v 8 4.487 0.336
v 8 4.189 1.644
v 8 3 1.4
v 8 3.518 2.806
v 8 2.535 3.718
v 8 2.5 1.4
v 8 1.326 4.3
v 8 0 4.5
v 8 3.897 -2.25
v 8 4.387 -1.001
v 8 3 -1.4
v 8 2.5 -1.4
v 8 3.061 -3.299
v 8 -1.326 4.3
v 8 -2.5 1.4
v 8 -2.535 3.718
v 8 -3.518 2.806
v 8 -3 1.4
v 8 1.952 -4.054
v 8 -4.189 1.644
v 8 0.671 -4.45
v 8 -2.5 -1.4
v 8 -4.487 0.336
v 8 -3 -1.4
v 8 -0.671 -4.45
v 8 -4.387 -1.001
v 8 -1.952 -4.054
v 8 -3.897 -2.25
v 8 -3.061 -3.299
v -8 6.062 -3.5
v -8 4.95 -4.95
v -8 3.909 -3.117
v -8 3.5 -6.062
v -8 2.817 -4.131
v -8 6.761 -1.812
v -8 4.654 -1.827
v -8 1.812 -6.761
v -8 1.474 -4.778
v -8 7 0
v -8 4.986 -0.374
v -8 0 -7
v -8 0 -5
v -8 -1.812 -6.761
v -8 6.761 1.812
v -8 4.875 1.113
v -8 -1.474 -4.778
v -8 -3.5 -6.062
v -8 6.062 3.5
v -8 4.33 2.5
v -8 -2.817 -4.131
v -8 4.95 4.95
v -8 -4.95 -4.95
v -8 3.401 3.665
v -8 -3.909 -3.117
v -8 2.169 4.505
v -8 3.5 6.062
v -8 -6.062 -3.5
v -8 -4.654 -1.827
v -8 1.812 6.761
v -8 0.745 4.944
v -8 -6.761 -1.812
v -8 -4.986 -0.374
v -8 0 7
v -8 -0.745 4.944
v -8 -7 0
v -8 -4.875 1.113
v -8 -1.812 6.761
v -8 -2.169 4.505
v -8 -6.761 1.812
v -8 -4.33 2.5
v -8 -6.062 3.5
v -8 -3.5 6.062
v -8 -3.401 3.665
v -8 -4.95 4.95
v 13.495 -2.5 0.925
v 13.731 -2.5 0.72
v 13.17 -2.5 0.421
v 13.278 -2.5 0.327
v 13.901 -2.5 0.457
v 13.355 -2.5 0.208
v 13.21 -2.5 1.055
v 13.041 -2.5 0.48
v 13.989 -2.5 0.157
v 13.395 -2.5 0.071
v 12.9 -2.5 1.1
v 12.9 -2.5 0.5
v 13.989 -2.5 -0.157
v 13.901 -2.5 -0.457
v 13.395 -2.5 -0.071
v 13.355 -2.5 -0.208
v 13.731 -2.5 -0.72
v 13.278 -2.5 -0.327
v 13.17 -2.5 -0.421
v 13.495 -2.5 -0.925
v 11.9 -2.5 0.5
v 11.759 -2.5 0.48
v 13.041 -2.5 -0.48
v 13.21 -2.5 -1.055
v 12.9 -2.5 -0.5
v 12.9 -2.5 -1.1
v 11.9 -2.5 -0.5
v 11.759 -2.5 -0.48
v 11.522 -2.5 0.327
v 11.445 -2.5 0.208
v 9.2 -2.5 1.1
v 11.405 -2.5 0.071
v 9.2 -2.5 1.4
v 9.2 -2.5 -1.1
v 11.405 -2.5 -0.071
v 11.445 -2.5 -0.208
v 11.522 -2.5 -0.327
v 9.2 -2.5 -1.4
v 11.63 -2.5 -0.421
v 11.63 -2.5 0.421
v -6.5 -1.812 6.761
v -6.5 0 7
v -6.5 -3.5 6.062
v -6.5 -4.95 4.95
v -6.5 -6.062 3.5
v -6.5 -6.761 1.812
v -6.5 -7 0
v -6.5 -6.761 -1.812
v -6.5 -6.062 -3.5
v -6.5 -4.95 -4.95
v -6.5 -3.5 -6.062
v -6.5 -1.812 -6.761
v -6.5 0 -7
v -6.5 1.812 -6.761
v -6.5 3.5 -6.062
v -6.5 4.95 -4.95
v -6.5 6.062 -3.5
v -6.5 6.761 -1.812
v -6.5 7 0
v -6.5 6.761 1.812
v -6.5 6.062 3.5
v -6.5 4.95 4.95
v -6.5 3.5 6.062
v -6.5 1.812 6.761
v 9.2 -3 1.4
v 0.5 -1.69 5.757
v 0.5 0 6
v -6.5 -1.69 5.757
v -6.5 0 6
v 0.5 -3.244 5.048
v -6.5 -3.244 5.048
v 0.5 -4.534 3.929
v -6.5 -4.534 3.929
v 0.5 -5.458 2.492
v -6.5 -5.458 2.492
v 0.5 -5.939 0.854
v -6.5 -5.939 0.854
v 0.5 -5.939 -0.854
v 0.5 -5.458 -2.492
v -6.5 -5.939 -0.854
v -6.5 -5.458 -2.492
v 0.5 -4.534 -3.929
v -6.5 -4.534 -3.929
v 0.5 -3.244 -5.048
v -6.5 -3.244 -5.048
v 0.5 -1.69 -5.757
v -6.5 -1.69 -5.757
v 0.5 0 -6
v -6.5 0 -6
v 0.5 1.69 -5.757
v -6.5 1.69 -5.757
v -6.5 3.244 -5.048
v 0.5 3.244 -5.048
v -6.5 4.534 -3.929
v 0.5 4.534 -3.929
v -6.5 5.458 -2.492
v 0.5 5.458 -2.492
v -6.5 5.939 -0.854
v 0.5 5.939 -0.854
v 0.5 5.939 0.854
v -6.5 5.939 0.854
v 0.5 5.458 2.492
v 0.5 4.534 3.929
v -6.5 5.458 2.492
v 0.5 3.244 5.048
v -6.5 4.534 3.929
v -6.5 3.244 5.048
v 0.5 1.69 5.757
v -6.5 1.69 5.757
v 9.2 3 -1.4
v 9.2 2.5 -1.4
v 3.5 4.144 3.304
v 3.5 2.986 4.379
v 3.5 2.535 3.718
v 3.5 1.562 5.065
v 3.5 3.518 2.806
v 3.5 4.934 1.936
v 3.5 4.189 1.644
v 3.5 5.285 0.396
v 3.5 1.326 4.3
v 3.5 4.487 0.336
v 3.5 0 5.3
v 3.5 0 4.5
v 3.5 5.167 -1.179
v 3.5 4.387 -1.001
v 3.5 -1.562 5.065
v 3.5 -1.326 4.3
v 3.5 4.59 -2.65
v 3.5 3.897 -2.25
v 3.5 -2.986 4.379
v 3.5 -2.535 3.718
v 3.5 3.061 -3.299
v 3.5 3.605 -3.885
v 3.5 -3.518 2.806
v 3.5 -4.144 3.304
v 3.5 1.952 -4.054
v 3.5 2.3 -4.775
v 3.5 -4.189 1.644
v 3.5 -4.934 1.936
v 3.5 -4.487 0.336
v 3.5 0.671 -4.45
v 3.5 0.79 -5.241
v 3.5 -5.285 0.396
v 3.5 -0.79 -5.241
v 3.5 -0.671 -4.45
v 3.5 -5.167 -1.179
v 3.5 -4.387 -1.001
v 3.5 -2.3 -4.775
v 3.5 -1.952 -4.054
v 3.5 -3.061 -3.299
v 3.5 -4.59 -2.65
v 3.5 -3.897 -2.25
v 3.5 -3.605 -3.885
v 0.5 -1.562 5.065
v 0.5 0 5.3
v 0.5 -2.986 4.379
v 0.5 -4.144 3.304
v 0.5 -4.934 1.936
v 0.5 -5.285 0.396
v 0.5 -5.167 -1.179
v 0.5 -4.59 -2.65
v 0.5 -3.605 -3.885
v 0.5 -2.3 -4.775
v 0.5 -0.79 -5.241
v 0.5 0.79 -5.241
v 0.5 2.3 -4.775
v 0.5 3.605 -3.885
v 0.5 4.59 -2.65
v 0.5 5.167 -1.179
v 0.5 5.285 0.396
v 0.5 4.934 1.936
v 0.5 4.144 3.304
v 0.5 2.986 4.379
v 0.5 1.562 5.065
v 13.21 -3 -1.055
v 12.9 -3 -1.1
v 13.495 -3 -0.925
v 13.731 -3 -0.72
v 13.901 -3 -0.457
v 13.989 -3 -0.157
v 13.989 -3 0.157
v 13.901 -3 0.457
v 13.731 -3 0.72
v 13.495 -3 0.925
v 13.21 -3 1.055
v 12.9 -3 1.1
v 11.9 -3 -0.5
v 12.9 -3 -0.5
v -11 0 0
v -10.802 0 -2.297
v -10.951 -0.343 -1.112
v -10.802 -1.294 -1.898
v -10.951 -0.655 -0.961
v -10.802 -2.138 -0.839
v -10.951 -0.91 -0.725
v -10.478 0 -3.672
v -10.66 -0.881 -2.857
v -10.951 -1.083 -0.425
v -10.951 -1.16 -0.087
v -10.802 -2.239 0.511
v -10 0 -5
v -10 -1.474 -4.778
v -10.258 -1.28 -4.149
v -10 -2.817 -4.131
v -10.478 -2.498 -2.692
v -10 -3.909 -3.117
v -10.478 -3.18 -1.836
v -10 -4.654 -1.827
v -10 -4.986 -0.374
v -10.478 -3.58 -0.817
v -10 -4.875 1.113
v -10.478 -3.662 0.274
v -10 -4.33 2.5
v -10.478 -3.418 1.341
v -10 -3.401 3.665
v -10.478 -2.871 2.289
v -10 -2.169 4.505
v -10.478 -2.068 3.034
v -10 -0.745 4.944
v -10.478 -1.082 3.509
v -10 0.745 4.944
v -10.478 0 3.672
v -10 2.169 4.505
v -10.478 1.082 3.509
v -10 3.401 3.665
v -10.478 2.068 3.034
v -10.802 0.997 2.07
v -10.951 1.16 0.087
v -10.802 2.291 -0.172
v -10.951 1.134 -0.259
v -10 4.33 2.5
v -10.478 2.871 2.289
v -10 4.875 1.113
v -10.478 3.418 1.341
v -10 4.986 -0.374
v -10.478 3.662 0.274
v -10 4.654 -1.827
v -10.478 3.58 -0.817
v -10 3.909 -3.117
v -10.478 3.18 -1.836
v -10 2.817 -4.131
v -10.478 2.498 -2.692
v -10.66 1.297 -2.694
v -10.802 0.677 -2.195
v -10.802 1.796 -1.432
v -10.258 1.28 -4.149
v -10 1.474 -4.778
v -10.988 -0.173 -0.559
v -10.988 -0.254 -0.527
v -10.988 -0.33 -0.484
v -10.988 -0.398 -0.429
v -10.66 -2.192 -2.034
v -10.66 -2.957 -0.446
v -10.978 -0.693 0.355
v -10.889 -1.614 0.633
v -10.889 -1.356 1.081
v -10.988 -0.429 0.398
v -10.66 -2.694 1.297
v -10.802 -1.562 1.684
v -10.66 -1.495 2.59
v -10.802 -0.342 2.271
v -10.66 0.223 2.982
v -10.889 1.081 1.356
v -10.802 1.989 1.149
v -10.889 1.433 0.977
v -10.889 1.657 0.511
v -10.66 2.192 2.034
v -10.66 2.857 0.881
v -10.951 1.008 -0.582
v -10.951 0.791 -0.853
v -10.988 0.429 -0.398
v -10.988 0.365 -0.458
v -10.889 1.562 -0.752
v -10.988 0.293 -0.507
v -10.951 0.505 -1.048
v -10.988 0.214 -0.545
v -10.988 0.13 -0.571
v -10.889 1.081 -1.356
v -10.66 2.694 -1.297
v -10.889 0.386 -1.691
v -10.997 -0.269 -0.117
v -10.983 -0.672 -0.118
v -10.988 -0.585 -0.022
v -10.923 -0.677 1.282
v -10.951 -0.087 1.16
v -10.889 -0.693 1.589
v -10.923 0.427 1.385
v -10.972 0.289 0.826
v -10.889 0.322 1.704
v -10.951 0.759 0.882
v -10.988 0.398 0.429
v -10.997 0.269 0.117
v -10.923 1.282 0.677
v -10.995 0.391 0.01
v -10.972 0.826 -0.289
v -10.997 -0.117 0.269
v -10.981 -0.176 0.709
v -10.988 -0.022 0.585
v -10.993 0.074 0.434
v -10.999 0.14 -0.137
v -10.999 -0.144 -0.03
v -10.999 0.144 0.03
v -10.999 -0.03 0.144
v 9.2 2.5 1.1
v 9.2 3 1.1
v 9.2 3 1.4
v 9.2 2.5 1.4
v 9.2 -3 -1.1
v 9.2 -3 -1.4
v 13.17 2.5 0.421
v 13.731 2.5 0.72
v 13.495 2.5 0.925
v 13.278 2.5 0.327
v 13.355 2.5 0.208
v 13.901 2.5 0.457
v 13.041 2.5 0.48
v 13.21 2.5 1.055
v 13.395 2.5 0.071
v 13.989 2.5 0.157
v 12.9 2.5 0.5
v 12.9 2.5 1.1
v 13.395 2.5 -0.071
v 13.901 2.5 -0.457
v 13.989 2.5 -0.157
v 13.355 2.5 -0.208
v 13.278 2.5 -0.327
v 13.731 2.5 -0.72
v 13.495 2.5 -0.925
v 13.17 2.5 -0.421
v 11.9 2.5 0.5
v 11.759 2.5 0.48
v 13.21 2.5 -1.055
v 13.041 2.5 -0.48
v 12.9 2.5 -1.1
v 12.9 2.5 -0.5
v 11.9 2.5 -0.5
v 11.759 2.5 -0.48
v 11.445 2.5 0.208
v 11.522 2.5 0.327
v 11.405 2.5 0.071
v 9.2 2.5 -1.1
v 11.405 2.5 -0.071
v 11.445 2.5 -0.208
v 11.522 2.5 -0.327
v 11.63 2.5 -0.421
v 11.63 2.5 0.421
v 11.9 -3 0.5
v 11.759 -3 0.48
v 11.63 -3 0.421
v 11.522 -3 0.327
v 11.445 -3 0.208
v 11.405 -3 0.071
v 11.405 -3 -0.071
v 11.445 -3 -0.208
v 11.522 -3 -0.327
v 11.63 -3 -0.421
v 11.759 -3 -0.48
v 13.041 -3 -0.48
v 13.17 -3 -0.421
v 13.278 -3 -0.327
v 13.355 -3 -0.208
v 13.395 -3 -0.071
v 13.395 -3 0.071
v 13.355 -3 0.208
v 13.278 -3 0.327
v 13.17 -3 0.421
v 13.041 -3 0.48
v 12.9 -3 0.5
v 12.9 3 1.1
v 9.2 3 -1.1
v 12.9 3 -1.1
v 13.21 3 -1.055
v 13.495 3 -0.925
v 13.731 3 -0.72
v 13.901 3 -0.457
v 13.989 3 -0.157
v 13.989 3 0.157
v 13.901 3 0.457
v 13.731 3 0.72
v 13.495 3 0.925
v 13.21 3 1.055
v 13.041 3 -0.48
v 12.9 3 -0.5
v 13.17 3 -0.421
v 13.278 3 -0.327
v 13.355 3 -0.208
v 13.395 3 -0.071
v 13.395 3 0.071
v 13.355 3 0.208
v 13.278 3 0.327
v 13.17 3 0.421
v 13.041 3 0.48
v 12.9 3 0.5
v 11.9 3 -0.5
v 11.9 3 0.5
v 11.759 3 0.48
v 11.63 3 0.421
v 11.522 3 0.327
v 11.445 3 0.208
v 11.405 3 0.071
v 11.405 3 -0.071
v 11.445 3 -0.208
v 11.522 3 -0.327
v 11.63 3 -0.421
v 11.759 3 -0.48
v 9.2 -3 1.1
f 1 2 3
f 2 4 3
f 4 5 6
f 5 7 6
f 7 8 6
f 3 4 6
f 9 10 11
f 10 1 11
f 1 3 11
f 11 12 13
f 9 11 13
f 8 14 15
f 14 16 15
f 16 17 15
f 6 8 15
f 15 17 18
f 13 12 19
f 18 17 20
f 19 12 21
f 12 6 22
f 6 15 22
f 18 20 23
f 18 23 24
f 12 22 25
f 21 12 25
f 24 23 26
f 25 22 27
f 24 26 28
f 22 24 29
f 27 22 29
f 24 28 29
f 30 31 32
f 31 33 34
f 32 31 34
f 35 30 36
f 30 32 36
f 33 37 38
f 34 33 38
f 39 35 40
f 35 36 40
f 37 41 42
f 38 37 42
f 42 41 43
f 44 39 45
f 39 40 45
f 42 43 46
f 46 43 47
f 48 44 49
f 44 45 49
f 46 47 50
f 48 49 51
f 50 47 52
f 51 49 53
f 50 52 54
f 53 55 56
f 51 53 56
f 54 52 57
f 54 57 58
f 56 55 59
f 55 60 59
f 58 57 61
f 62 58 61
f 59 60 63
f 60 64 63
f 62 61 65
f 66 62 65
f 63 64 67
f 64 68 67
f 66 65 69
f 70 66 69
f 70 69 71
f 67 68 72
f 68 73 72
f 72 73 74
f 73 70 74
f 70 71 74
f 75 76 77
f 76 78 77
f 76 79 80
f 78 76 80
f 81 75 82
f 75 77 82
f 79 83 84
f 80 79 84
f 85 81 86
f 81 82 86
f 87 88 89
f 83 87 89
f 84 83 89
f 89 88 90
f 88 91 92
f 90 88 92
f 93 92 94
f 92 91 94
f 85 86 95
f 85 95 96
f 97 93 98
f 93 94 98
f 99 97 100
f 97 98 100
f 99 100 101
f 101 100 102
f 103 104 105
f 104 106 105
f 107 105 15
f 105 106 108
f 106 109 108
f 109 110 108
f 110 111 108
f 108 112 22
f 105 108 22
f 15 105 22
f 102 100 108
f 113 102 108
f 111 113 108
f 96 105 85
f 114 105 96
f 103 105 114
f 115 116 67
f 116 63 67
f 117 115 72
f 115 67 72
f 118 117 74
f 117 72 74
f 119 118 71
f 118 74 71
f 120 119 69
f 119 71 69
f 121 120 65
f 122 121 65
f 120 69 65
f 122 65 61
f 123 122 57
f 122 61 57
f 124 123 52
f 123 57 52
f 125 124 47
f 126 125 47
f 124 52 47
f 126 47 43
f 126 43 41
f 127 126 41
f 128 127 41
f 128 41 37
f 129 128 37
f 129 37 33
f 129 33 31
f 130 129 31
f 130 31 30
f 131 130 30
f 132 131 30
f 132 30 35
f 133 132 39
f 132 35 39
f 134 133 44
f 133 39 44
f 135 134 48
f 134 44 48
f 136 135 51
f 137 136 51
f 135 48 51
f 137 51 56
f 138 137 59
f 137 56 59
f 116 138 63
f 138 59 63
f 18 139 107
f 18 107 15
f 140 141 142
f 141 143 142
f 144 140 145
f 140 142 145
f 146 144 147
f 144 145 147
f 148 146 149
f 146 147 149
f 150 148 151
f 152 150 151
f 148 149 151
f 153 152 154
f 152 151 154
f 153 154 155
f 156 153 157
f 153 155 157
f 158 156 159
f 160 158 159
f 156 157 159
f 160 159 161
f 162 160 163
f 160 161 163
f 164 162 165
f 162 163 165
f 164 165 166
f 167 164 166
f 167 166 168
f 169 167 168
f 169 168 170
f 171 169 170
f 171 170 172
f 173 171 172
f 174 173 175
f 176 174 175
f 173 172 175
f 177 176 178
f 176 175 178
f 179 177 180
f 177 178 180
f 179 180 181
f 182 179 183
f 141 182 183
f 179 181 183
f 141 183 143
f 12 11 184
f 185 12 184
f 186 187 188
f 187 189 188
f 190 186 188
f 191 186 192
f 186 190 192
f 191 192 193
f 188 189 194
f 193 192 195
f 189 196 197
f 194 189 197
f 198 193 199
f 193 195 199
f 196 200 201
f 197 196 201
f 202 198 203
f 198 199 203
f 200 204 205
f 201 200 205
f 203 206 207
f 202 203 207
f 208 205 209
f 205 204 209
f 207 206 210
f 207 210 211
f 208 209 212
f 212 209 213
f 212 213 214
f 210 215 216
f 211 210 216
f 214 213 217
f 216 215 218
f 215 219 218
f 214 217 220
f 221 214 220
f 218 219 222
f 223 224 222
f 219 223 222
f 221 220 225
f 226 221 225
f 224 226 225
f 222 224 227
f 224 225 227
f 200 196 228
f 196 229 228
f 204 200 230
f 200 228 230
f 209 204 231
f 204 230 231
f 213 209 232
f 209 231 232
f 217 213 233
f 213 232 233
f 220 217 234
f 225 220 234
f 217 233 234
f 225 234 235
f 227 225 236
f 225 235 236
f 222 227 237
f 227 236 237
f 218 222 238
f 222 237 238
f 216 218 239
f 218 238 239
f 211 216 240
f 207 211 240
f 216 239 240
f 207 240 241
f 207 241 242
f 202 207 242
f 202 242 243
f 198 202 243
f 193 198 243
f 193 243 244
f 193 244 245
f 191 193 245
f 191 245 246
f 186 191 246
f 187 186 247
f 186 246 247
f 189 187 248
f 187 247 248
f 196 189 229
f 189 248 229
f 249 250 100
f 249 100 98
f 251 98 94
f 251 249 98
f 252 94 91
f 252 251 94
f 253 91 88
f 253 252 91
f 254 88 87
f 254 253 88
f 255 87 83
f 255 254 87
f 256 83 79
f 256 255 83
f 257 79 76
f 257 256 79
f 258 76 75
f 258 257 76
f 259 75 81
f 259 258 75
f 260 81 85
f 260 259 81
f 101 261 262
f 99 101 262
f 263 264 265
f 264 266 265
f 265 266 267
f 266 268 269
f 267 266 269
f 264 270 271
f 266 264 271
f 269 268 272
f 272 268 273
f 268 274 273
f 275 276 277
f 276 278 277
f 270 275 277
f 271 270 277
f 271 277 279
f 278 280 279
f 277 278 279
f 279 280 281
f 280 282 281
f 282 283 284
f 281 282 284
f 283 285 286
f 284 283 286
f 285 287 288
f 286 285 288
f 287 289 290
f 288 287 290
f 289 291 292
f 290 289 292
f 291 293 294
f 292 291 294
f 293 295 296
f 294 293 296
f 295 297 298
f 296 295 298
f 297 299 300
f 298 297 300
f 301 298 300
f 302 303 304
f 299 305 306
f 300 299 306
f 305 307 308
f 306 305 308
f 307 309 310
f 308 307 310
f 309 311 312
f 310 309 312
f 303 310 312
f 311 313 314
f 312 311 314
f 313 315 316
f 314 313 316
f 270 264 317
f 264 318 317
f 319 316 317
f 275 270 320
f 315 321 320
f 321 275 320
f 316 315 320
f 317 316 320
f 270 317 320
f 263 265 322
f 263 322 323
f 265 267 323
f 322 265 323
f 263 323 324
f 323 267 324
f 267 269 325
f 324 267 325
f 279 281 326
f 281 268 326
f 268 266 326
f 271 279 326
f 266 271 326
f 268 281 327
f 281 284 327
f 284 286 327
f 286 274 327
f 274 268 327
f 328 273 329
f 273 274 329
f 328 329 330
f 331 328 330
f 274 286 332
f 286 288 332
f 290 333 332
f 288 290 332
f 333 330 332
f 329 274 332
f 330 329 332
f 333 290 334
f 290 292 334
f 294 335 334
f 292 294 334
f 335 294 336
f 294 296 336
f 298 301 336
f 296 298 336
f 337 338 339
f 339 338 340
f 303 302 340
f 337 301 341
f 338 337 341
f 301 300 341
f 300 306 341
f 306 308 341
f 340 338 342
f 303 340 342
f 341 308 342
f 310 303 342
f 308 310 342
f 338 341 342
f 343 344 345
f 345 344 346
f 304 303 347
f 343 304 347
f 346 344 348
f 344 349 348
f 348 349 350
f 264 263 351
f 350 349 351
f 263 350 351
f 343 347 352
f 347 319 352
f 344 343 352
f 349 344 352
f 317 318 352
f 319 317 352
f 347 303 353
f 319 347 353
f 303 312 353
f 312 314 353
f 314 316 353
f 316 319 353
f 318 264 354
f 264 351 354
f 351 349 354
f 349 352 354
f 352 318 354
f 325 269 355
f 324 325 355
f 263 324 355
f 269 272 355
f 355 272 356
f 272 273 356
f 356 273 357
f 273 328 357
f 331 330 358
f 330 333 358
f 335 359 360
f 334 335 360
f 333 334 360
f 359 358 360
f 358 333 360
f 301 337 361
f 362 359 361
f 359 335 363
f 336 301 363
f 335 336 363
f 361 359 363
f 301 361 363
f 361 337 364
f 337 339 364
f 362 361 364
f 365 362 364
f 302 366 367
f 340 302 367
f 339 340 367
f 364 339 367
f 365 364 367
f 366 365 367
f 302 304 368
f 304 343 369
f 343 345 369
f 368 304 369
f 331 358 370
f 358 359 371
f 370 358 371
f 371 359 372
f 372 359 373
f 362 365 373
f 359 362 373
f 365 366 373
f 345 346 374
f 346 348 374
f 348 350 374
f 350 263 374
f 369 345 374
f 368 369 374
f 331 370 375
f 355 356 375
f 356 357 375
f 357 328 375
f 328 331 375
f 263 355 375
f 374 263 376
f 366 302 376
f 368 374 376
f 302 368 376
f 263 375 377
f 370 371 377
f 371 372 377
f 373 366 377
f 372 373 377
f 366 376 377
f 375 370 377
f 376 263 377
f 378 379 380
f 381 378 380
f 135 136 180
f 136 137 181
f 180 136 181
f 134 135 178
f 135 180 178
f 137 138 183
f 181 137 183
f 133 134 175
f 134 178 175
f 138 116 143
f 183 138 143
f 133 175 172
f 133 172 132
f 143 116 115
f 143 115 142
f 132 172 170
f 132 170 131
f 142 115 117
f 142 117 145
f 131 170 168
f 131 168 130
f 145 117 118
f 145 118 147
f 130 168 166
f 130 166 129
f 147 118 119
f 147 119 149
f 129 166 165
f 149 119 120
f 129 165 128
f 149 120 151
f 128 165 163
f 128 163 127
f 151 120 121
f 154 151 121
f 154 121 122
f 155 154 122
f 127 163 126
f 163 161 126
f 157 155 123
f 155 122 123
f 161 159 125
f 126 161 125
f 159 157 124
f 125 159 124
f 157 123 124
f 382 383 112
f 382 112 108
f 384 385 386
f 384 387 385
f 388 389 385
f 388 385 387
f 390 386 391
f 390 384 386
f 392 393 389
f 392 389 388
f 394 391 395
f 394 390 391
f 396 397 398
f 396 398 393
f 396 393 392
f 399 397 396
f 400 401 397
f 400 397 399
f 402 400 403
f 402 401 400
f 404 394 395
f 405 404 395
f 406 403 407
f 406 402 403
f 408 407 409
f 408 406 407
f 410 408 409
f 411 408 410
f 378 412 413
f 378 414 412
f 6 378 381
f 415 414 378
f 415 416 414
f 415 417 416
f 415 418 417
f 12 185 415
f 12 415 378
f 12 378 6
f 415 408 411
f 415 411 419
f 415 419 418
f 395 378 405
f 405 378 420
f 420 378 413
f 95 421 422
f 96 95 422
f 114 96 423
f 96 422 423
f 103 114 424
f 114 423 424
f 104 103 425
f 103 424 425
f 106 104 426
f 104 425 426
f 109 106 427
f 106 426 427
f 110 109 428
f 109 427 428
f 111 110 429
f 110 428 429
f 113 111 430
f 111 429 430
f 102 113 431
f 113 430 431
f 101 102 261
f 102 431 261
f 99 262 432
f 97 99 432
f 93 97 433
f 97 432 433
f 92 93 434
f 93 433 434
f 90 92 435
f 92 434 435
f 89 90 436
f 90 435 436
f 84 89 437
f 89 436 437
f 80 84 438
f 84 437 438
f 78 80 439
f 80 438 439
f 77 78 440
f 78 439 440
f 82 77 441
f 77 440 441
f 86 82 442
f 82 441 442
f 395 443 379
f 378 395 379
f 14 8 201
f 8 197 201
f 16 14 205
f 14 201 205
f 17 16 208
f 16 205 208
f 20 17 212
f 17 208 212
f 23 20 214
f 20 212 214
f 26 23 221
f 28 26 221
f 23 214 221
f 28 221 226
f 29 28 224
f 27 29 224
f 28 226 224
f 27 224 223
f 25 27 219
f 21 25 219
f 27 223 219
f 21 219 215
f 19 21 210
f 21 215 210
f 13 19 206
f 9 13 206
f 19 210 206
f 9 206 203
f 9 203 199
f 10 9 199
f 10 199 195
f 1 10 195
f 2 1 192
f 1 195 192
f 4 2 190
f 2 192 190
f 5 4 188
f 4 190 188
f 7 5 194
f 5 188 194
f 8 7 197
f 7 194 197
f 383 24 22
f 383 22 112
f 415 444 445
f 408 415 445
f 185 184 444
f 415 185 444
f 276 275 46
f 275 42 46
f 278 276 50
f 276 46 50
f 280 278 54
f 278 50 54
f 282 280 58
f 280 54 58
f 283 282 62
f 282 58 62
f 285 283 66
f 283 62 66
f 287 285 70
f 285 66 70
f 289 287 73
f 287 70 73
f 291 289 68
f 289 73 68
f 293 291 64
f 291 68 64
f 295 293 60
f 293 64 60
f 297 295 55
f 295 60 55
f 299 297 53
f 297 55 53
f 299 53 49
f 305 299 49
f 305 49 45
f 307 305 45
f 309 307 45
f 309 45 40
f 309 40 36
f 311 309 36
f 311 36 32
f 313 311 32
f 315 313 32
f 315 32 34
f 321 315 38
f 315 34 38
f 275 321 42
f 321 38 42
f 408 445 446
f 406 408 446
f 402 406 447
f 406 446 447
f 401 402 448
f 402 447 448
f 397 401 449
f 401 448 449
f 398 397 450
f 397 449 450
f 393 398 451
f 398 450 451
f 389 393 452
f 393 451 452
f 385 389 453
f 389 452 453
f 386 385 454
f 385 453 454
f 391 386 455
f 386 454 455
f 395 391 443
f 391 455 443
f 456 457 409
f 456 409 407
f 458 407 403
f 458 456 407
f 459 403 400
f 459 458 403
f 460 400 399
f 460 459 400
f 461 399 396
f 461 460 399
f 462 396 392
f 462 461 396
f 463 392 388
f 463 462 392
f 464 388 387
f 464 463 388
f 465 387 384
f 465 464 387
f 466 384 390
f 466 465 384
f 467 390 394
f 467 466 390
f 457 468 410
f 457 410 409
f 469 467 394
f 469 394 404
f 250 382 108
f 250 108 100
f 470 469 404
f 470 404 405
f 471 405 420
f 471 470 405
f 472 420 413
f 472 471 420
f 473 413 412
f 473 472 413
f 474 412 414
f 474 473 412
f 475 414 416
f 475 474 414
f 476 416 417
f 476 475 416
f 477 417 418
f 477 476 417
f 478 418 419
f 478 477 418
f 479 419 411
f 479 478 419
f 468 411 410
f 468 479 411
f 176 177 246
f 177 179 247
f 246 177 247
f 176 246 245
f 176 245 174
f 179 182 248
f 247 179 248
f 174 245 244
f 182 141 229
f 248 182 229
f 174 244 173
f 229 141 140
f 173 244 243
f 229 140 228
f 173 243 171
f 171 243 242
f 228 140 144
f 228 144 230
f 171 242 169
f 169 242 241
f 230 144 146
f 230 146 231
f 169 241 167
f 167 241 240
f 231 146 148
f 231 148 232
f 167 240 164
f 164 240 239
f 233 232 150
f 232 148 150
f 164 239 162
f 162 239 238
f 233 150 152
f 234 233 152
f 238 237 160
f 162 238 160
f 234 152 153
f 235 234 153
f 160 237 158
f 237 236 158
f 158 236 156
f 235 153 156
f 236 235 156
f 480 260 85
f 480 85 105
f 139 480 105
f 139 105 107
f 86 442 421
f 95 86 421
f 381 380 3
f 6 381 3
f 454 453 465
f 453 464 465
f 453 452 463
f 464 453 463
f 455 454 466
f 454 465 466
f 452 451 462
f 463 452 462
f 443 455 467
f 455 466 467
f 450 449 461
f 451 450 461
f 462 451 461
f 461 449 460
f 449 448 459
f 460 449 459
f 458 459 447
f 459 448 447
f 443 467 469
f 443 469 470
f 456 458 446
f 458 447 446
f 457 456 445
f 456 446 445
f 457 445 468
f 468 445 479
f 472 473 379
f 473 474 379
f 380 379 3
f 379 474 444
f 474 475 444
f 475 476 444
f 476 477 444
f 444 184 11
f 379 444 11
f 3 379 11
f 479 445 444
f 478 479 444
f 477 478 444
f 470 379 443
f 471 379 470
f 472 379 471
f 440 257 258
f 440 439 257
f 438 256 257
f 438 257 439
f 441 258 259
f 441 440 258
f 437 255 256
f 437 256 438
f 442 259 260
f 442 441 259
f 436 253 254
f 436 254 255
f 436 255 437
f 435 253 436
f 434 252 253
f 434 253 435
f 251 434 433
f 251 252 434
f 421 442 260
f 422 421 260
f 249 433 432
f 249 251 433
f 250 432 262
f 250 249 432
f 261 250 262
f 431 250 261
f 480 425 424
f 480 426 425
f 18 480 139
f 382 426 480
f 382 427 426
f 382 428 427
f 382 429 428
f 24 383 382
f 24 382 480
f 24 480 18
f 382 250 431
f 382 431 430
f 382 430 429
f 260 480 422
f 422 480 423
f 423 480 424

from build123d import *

# Parameters (mm, degrees)
BOSS_EXTRUDE1_DEPTH = 0.5


with BuildPart() as part:
    # Sketch1 → Revolve1 (revolve)
    with BuildSketch(Plane(origin=(0, 0, 0), x_dir=(1, 0, 0), z_dir=(0, 1, 0)), mode=Mode.PRIVATE) as revolve1_sk:
        Polygon((-8, 0), (8, 0), (8, 4.5), (3.5, 4.5), (3.5, 5.3), (0.5, 5.3), (0.5, 6), (-6.5, 6), (-6.5, 7), (-8, 7), align=None)
    revolve(revolve1_sk.sketch.rotate(Axis((-8, 0, 0), (1, 0, 0)), 180), axis=Axis((-8, 0, 0), (1, 0, 0)))

    # Sketch2 → Revolve2 (revolve)
    with BuildSketch(Plane(origin=(0, 0, 0), x_dir=(1, 0, 0), z_dir=(0, 1, 0))):
        with BuildLine():
            Line((-8, 0), (-11, 0))
            add(Edge.make_bspline(
                [(-11, 0), (-11, 2.651487421), (-10, 5)],
                knots=[0, 0, 0, 1, 1, 1], degree=2))
            Line((-10, 5), (-8, 5))
            Line((-8, 5), (-8, 0))
        make_face()
    revolve(axis=Axis((-8, 0, 0), (-1, 0, 0)))

    # Sketch3 → Boss-Extrude1 (add)
    with BuildSketch(Plane(origin=(0, 3, 0), x_dir=(1, 0, 0), z_dir=(0, 1, 0))):
        with BuildLine():
            Line((8, -1.4), (8, 1.4))
            Line((8, 1.4), (9.2, 1.4))
            Line((9.2, 1.4), (9.2, 1.1))
            Line((9.2, 1.1), (12.9, 1.1))
            ThreePointArc((12.9, 1.1), (14, 0), (12.9, -1.1))
            Line((12.9, -1.1), (9.2, -1.1))
            Line((9.2, -1.1), (9.2, -1.4))
            Line((9.2, -1.4), (8, -1.4))
        make_face()
        with BuildLine():
            Line((11.9, 0.5), (12.9, 0.5))
            ThreePointArc((12.9, 0.5), (13.4, 0), (12.9, -0.5))
            Line((12.9, -0.5), (11.9, -0.5))
            ThreePointArc((11.9, -0.5), (11.4, 0), (11.9, 0.5))
        make_face(mode=Mode.SUBTRACT)
    boss_extrude1 = extrude(amount=-BOSS_EXTRUDE1_DEPTH)

    # Mirror1: Boss-Extrude1 across plane
    add(boss_extrude1.mirror(Plane.ZX))


solid = part.part
